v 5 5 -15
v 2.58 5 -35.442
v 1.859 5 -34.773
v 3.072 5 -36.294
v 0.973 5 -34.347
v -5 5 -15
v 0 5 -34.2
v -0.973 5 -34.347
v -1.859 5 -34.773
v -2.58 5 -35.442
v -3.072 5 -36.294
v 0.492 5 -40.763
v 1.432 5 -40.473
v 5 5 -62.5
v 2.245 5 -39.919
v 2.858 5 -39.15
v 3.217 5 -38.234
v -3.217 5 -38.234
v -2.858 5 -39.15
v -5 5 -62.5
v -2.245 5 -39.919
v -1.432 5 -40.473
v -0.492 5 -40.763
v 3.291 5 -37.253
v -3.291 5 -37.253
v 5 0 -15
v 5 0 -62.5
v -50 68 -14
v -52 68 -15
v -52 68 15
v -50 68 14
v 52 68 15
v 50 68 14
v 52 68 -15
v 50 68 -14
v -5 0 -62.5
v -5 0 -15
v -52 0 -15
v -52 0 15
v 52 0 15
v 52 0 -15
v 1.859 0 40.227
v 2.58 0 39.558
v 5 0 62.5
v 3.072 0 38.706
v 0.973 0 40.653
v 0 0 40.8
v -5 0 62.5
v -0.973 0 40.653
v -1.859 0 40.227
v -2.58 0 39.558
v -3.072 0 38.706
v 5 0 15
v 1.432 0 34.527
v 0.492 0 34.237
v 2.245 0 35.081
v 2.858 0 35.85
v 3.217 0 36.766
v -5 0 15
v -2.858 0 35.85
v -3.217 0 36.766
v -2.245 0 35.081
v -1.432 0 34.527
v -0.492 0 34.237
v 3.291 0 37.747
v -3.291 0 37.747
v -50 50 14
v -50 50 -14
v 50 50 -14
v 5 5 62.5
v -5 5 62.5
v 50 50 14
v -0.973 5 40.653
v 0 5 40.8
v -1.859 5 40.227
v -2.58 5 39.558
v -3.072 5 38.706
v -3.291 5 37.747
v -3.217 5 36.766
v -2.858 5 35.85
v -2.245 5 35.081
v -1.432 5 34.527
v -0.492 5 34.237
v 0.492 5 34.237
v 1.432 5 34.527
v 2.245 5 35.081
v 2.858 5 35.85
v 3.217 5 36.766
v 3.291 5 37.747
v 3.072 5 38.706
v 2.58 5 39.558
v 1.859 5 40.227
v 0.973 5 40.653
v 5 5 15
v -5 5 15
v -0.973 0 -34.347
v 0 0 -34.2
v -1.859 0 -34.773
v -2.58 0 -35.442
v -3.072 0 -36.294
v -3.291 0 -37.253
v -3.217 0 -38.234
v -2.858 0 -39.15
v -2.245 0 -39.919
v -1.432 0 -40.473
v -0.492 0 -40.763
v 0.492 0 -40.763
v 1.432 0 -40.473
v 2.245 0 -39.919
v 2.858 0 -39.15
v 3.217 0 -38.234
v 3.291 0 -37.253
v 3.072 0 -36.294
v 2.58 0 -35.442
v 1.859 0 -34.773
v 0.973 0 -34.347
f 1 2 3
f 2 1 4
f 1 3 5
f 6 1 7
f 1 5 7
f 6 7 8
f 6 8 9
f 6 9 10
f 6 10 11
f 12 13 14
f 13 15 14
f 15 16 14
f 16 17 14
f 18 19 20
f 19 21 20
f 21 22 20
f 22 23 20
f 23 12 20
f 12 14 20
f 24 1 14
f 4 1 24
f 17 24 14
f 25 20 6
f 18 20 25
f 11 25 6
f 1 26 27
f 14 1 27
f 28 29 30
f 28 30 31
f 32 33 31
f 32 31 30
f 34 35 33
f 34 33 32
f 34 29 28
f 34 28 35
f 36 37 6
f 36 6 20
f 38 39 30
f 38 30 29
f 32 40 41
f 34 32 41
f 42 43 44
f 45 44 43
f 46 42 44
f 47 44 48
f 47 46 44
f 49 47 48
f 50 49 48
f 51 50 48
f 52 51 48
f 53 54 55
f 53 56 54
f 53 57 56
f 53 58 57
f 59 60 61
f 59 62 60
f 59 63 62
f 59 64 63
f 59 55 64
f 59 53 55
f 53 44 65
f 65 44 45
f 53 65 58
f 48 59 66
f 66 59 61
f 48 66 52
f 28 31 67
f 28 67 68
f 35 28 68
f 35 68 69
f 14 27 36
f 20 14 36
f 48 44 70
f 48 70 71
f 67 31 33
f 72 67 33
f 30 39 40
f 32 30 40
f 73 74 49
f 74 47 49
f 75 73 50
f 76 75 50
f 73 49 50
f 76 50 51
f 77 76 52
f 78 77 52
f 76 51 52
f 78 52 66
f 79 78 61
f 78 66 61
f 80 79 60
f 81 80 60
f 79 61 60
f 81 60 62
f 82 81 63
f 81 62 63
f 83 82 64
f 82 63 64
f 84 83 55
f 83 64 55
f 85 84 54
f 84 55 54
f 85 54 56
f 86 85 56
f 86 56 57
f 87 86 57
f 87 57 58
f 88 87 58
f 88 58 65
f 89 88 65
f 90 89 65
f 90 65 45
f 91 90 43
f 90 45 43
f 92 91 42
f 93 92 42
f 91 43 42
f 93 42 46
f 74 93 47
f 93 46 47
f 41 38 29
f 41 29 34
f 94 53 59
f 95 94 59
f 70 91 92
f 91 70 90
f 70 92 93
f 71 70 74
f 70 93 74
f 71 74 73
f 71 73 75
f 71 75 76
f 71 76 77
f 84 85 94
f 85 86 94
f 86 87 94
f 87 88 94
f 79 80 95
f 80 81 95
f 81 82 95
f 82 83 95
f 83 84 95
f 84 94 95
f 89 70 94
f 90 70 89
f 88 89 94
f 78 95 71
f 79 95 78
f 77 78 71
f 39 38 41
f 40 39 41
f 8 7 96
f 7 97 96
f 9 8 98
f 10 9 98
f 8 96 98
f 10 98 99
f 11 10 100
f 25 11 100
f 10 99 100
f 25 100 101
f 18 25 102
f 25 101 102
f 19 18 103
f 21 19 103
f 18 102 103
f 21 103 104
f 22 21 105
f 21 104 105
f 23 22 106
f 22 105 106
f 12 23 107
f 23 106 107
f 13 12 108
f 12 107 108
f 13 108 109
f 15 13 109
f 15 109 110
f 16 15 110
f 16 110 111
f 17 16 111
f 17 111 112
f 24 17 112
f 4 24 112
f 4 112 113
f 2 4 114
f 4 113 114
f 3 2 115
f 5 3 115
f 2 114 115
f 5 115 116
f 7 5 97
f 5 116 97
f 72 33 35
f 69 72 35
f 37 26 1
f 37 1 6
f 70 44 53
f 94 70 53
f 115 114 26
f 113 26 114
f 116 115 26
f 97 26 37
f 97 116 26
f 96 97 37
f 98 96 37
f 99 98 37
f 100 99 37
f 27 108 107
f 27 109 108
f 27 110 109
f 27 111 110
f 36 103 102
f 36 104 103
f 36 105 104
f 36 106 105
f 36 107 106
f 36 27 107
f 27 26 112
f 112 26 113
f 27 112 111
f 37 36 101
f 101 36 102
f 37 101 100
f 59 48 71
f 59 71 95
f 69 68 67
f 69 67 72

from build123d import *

# Parameters (mm, degrees)
SKETCH2_W           = 104
SKETCH2_H           = 30
BOSS_EXTRUDE1_DEPTH = 68
SKETCH3_W           = 100
SKETCH3_H           = 28
CUT_EXTRUDE1_DEPTH  = 18
SKETCH4_W           = 10
SKETCH4_H           = 47.5
BOSS_EXTRUDE3_DEPTH = 5
SKETCH7_W           = 3.3
SKETCH7_H           = 5
SKETCH13_W          = 10
SKETCH13_H          = 47.5
BOSS_EXTRUDE4_DEPTH = 5
SKETCH14_W          = 3.3
SKETCH14_H          = 5


with BuildPart() as part:
    # Sketch2 → Boss-Extrude1 (new body)
    with BuildSketch(Plane(origin=(0, 0, 0), x_dir=(1, 0, 0), z_dir=(0, 1, 0))):
        Rectangle(SKETCH2_W, SKETCH2_H)
    extrude(amount=BOSS_EXTRUDE1_DEPTH)

    # Sketch3 → Cut-Extrude1 (cut)
    with BuildSketch(Plane(origin=(0, 68, 0), x_dir=(1, 0, 0), z_dir=(0, 1, 0))):
        Rectangle(SKETCH3_W, SKETCH3_H)
    extrude(amount=-CUT_EXTRUDE1_DEPTH, mode=Mode.SUBTRACT)


with BuildPart() as body_2:
    # Sketch4 → Boss-Extrude3 (new body)
    with BuildSketch(Plane(origin=(0, 0, 0), x_dir=(-1, 0, 0), z_dir=(0, -1, 0))):
        with Locations((0, -38.75)):
            Rectangle(SKETCH4_W, SKETCH4_H)
    extrude(amount=-BOSS_EXTRUDE3_DEPTH)

    # Sketch7 → M6 Clearance Hole1 (revolve, cut)
    with BuildSketch(Plane(origin=(0, 5, 37.5), x_dir=(0, 0, 1), z_dir=(1, 0, 0))):
        with Locations((1.65, 2.5)):
            Rectangle(SKETCH7_W, SKETCH7_H)
    revolve(axis=Axis((0, 11.35, 37.5), (0, -1, 0)), mode=Mode.SUBTRACT)


with BuildPart() as body_3:
    # Sketch13 → Boss-Extrude4 (new body)
    with BuildSketch(Plane(origin=(0, 0, 0), x_dir=(-1, 0, 0), z_dir=(0, -1, 0))):
        with Locations((0, 38.75)):
            Rectangle(SKETCH13_W, SKETCH13_H)
    extrude(amount=-BOSS_EXTRUDE4_DEPTH)

    # Sketch14 → M6 Clearance Hole2 (revolve, cut)
    with BuildSketch(Plane(origin=(0, 5, -37.5), x_dir=(0, 0, 1), z_dir=(1, 0, 0))):
        with Locations((1.65, 2.5)):
            Rectangle(SKETCH14_W, SKETCH14_H)
    revolve(axis=Axis((0, 11.35, -37.5), (0, -1, 0)), mode=Mode.SUBTRACT)


solid = Compound([part.part, body_2.part, body_3.part])
